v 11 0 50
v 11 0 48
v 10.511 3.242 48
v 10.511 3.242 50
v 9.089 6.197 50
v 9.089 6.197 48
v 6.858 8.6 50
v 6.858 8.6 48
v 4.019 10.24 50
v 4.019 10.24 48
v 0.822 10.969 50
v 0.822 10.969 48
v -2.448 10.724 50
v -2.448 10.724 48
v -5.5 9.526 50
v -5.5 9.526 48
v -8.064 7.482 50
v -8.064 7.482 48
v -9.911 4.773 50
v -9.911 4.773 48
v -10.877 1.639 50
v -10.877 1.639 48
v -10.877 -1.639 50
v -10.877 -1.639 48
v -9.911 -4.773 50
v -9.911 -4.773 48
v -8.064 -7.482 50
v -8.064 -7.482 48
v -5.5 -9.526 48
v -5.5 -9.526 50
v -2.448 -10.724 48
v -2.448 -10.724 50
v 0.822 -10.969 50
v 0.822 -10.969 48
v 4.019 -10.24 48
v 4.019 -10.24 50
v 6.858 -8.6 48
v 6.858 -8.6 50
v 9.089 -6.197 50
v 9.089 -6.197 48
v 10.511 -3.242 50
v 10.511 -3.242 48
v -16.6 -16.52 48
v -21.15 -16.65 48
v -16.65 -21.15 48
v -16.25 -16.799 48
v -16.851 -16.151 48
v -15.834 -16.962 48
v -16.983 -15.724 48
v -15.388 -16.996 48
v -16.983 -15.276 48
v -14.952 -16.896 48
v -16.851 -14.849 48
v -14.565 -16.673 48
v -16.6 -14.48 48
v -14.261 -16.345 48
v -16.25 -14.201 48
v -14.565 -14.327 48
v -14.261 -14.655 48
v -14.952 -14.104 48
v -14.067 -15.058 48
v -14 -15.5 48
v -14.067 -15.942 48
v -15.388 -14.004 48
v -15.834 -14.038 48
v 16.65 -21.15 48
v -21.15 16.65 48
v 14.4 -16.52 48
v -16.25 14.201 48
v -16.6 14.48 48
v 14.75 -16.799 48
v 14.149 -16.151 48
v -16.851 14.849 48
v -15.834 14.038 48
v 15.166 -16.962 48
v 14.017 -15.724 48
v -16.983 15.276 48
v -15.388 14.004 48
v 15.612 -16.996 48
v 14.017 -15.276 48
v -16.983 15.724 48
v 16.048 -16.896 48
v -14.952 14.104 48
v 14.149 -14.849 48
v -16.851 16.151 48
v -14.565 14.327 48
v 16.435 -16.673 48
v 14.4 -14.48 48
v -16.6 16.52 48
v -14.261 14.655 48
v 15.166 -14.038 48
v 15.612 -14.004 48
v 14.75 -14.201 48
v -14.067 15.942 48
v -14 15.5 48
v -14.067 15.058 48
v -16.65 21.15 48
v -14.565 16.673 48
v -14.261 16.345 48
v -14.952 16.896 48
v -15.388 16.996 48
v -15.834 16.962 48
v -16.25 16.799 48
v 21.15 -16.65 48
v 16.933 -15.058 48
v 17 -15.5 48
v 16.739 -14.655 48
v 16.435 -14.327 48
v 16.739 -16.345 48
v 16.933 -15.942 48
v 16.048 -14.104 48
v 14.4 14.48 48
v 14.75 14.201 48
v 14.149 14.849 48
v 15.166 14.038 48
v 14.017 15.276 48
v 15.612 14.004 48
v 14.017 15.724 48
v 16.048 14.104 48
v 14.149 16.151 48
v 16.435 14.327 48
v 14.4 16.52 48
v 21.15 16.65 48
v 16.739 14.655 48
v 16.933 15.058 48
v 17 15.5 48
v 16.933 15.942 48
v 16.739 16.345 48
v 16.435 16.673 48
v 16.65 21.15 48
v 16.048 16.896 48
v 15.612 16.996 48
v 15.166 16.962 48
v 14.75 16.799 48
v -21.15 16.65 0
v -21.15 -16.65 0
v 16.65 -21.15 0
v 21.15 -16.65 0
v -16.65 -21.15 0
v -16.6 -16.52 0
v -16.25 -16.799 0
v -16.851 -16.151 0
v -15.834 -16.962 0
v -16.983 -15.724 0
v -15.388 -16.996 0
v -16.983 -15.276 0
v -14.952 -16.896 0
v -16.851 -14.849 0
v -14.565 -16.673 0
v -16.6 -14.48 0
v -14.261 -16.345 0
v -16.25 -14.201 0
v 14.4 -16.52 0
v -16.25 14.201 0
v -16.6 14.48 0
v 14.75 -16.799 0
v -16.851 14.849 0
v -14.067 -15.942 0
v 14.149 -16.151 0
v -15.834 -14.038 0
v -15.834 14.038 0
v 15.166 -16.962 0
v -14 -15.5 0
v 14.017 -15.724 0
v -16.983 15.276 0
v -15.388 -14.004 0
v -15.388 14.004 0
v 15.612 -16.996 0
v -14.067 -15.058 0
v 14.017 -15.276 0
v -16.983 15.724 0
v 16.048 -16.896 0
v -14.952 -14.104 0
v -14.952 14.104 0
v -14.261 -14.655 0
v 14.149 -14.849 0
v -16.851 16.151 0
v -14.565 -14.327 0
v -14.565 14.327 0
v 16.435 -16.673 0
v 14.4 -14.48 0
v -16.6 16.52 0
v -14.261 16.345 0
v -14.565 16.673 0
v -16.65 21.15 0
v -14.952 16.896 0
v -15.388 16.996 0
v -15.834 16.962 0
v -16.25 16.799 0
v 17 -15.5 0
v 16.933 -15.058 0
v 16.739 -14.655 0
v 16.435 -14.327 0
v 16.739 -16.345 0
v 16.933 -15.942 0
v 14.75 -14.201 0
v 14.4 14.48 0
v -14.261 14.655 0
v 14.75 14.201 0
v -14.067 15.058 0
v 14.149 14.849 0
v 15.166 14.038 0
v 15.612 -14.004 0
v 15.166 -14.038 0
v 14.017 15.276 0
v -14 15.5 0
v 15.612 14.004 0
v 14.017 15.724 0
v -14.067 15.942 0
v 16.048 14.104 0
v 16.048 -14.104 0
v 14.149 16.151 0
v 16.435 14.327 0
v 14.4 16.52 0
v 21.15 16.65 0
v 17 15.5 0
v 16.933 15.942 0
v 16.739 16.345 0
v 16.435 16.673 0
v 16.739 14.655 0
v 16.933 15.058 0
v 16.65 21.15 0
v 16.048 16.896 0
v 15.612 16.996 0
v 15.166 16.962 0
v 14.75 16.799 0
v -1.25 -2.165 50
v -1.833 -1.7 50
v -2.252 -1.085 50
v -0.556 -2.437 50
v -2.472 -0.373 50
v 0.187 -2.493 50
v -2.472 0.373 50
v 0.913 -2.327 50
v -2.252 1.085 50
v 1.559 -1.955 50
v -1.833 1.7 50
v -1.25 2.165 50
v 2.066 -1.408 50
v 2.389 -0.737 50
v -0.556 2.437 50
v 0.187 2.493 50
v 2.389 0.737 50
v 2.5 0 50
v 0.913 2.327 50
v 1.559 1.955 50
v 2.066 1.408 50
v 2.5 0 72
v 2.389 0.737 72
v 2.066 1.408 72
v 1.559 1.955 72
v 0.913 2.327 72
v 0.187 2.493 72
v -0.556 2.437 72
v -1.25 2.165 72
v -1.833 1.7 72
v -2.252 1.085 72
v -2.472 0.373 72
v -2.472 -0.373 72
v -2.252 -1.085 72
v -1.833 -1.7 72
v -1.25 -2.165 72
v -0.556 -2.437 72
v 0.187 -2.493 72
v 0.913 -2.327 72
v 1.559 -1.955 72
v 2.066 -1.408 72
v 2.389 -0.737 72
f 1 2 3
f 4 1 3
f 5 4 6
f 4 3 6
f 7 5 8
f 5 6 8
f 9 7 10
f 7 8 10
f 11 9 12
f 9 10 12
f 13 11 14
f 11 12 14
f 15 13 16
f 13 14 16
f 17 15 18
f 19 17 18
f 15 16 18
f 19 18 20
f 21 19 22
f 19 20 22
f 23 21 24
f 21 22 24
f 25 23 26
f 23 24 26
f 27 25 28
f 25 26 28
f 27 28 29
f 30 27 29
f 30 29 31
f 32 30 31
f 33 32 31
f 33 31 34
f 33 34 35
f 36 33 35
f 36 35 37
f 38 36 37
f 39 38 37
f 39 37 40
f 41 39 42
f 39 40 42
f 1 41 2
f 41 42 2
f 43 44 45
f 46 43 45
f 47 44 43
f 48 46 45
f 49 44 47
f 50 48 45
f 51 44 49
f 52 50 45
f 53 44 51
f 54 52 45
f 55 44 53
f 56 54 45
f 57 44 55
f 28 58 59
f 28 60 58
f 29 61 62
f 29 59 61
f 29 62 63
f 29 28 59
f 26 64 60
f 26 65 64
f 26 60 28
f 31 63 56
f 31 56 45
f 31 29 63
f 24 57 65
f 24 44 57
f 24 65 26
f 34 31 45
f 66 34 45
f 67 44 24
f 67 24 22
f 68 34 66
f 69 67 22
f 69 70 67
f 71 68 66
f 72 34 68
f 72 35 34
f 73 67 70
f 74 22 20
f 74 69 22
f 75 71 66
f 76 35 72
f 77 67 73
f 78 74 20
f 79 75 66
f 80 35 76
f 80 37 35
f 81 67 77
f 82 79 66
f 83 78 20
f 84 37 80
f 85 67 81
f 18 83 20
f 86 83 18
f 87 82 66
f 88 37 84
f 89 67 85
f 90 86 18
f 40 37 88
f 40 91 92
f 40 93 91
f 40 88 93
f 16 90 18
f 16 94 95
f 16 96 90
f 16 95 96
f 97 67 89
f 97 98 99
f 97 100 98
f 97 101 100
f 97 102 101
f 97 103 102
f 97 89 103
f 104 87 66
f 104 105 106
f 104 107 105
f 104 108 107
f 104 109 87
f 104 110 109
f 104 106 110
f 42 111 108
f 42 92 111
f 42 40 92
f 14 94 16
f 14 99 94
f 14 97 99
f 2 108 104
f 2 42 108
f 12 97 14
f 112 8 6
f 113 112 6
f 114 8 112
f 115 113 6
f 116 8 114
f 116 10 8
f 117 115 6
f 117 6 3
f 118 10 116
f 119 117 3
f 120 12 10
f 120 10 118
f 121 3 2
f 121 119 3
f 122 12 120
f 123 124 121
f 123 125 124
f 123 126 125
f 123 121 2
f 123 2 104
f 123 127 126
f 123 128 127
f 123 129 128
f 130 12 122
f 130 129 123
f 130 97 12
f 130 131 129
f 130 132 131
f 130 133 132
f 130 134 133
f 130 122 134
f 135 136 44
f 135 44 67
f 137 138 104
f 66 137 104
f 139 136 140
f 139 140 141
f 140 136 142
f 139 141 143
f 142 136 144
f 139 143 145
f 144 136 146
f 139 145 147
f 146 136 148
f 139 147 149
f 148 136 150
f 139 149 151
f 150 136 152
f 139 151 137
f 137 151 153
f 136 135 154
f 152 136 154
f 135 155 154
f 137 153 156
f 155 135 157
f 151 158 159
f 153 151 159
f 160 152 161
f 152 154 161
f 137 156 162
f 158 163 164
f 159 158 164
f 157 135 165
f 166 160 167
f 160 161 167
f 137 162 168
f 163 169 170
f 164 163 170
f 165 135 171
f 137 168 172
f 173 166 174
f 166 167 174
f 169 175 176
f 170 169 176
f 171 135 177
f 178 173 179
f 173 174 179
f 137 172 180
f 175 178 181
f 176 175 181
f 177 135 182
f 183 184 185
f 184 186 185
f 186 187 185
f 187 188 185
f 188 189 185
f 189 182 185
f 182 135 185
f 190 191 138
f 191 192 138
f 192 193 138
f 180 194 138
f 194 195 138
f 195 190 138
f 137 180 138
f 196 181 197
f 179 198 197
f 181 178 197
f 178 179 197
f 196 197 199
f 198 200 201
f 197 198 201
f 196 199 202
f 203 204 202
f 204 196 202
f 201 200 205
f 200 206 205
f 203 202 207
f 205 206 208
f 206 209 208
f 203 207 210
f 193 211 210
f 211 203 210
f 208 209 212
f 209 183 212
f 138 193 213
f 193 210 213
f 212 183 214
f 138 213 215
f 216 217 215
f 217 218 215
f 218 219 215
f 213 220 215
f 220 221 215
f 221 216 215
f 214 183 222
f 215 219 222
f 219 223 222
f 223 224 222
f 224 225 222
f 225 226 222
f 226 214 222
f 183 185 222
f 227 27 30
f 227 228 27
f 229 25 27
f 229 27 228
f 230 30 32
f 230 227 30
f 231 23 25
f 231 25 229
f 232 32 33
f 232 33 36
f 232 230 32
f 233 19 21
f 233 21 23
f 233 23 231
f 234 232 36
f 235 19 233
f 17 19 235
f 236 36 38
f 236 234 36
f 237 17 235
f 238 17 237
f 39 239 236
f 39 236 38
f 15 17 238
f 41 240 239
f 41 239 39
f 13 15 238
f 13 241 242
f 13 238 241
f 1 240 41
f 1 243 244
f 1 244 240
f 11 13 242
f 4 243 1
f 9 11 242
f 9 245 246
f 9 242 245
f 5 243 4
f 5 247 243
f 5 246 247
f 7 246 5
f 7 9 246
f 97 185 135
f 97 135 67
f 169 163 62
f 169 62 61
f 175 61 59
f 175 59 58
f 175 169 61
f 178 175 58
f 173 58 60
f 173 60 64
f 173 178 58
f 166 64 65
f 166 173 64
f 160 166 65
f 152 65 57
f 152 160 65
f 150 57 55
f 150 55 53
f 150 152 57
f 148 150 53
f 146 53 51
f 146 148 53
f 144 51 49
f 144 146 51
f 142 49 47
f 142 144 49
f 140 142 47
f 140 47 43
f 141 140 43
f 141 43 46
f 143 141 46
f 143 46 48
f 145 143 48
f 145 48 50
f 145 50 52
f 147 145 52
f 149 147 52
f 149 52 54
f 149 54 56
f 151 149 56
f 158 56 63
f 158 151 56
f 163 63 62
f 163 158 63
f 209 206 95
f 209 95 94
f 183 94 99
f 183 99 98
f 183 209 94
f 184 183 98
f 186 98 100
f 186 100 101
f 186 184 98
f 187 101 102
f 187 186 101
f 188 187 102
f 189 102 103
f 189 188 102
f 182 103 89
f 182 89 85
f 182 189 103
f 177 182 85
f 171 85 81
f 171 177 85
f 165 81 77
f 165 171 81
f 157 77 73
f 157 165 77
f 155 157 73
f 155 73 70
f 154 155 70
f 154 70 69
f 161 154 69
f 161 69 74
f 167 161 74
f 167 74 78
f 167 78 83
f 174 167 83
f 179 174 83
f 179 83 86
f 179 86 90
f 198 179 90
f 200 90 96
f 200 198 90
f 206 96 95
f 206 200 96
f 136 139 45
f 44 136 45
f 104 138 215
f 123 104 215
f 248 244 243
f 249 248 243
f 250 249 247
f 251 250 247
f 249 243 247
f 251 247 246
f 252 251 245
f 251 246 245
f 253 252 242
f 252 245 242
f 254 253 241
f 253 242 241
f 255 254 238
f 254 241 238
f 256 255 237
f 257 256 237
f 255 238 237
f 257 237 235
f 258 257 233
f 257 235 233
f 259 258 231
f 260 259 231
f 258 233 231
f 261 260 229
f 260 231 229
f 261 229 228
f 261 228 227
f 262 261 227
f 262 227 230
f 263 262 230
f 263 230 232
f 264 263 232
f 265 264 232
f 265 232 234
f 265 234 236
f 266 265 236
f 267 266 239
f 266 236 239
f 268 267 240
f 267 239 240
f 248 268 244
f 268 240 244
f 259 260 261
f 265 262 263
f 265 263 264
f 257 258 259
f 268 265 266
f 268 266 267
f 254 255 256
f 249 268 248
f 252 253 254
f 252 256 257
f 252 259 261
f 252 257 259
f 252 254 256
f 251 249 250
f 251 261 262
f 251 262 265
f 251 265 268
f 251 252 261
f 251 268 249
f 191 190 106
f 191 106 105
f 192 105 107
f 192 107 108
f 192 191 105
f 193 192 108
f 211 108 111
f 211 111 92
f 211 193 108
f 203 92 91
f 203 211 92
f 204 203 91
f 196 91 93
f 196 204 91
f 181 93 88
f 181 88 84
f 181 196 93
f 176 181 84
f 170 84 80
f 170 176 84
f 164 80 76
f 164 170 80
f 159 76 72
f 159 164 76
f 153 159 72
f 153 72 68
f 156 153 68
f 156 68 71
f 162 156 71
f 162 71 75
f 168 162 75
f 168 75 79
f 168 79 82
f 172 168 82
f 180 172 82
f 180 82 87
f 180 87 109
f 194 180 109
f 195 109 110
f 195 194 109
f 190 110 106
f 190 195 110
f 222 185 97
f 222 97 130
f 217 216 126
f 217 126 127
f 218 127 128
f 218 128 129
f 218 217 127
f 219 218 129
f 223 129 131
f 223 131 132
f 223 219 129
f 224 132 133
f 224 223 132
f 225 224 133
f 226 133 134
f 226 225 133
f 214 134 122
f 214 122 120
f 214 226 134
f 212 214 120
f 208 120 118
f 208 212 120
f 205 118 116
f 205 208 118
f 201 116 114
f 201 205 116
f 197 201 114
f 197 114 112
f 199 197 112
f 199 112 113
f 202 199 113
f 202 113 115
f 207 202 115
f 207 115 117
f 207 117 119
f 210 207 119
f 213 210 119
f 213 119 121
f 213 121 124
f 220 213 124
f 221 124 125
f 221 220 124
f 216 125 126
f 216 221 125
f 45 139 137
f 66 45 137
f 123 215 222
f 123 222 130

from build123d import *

# Parameters (mm, degrees)
SKETCH1_W           = 42.3
SKETCH1_H           = 42.3
SKETCH1_R           = 1.5
BOSS_EXTRUDE1_DEPTH = 48
SKETCH2_R           = 11
BOSS_EXTRUDE2_DEPTH = 2
SKETCH3_R           = 2.5
BOSS_EXTRUDE3_DEPTH = 22
CHAMFER1_SIZE       = 4.5


with BuildPart() as part:
    # Sketch1 → Boss-Extrude1 (new body)
    with BuildSketch(Plane.XY):
        Rectangle(SKETCH1_W, SKETCH1_H)
        with Locations((-15.5, 15.5)):
            Circle(SKETCH1_R, mode=Mode.SUBTRACT)
        with Locations((15.5, 15.5)):
            Circle(SKETCH1_R, mode=Mode.SUBTRACT)
        with Locations((-15.5, -15.5)):
            Circle(SKETCH1_R, mode=Mode.SUBTRACT)
        with Locations((15.5, -15.5)):
            Circle(SKETCH1_R, mode=Mode.SUBTRACT)
    extrude(amount=BOSS_EXTRUDE1_DEPTH)

    # Sketch2 → Boss-Extrude2 (add)
    with BuildSketch(Plane.XY.offset(48)):
        Circle(SKETCH2_R)
    extrude(amount=BOSS_EXTRUDE2_DEPTH)

    # Sketch3 → Boss-Extrude3 (add)
    with BuildSketch(Plane.XY.offset(50)):
        Circle(SKETCH3_R)
    extrude(amount=BOSS_EXTRUDE3_DEPTH)

    # Chamfer1
    chamfer1_edges = [part.edges().sort_by_distance(p)[0] for p in [
        (-21.15, 21.15, 24),
        (21.15, 21.15, 24),
        (21.15, -21.15, 24),
        (-21.15, -21.15, 24),
    ]]
    chamfer(chamfer1_edges, length=CHAMFER1_SIZE)


solid = part.part
